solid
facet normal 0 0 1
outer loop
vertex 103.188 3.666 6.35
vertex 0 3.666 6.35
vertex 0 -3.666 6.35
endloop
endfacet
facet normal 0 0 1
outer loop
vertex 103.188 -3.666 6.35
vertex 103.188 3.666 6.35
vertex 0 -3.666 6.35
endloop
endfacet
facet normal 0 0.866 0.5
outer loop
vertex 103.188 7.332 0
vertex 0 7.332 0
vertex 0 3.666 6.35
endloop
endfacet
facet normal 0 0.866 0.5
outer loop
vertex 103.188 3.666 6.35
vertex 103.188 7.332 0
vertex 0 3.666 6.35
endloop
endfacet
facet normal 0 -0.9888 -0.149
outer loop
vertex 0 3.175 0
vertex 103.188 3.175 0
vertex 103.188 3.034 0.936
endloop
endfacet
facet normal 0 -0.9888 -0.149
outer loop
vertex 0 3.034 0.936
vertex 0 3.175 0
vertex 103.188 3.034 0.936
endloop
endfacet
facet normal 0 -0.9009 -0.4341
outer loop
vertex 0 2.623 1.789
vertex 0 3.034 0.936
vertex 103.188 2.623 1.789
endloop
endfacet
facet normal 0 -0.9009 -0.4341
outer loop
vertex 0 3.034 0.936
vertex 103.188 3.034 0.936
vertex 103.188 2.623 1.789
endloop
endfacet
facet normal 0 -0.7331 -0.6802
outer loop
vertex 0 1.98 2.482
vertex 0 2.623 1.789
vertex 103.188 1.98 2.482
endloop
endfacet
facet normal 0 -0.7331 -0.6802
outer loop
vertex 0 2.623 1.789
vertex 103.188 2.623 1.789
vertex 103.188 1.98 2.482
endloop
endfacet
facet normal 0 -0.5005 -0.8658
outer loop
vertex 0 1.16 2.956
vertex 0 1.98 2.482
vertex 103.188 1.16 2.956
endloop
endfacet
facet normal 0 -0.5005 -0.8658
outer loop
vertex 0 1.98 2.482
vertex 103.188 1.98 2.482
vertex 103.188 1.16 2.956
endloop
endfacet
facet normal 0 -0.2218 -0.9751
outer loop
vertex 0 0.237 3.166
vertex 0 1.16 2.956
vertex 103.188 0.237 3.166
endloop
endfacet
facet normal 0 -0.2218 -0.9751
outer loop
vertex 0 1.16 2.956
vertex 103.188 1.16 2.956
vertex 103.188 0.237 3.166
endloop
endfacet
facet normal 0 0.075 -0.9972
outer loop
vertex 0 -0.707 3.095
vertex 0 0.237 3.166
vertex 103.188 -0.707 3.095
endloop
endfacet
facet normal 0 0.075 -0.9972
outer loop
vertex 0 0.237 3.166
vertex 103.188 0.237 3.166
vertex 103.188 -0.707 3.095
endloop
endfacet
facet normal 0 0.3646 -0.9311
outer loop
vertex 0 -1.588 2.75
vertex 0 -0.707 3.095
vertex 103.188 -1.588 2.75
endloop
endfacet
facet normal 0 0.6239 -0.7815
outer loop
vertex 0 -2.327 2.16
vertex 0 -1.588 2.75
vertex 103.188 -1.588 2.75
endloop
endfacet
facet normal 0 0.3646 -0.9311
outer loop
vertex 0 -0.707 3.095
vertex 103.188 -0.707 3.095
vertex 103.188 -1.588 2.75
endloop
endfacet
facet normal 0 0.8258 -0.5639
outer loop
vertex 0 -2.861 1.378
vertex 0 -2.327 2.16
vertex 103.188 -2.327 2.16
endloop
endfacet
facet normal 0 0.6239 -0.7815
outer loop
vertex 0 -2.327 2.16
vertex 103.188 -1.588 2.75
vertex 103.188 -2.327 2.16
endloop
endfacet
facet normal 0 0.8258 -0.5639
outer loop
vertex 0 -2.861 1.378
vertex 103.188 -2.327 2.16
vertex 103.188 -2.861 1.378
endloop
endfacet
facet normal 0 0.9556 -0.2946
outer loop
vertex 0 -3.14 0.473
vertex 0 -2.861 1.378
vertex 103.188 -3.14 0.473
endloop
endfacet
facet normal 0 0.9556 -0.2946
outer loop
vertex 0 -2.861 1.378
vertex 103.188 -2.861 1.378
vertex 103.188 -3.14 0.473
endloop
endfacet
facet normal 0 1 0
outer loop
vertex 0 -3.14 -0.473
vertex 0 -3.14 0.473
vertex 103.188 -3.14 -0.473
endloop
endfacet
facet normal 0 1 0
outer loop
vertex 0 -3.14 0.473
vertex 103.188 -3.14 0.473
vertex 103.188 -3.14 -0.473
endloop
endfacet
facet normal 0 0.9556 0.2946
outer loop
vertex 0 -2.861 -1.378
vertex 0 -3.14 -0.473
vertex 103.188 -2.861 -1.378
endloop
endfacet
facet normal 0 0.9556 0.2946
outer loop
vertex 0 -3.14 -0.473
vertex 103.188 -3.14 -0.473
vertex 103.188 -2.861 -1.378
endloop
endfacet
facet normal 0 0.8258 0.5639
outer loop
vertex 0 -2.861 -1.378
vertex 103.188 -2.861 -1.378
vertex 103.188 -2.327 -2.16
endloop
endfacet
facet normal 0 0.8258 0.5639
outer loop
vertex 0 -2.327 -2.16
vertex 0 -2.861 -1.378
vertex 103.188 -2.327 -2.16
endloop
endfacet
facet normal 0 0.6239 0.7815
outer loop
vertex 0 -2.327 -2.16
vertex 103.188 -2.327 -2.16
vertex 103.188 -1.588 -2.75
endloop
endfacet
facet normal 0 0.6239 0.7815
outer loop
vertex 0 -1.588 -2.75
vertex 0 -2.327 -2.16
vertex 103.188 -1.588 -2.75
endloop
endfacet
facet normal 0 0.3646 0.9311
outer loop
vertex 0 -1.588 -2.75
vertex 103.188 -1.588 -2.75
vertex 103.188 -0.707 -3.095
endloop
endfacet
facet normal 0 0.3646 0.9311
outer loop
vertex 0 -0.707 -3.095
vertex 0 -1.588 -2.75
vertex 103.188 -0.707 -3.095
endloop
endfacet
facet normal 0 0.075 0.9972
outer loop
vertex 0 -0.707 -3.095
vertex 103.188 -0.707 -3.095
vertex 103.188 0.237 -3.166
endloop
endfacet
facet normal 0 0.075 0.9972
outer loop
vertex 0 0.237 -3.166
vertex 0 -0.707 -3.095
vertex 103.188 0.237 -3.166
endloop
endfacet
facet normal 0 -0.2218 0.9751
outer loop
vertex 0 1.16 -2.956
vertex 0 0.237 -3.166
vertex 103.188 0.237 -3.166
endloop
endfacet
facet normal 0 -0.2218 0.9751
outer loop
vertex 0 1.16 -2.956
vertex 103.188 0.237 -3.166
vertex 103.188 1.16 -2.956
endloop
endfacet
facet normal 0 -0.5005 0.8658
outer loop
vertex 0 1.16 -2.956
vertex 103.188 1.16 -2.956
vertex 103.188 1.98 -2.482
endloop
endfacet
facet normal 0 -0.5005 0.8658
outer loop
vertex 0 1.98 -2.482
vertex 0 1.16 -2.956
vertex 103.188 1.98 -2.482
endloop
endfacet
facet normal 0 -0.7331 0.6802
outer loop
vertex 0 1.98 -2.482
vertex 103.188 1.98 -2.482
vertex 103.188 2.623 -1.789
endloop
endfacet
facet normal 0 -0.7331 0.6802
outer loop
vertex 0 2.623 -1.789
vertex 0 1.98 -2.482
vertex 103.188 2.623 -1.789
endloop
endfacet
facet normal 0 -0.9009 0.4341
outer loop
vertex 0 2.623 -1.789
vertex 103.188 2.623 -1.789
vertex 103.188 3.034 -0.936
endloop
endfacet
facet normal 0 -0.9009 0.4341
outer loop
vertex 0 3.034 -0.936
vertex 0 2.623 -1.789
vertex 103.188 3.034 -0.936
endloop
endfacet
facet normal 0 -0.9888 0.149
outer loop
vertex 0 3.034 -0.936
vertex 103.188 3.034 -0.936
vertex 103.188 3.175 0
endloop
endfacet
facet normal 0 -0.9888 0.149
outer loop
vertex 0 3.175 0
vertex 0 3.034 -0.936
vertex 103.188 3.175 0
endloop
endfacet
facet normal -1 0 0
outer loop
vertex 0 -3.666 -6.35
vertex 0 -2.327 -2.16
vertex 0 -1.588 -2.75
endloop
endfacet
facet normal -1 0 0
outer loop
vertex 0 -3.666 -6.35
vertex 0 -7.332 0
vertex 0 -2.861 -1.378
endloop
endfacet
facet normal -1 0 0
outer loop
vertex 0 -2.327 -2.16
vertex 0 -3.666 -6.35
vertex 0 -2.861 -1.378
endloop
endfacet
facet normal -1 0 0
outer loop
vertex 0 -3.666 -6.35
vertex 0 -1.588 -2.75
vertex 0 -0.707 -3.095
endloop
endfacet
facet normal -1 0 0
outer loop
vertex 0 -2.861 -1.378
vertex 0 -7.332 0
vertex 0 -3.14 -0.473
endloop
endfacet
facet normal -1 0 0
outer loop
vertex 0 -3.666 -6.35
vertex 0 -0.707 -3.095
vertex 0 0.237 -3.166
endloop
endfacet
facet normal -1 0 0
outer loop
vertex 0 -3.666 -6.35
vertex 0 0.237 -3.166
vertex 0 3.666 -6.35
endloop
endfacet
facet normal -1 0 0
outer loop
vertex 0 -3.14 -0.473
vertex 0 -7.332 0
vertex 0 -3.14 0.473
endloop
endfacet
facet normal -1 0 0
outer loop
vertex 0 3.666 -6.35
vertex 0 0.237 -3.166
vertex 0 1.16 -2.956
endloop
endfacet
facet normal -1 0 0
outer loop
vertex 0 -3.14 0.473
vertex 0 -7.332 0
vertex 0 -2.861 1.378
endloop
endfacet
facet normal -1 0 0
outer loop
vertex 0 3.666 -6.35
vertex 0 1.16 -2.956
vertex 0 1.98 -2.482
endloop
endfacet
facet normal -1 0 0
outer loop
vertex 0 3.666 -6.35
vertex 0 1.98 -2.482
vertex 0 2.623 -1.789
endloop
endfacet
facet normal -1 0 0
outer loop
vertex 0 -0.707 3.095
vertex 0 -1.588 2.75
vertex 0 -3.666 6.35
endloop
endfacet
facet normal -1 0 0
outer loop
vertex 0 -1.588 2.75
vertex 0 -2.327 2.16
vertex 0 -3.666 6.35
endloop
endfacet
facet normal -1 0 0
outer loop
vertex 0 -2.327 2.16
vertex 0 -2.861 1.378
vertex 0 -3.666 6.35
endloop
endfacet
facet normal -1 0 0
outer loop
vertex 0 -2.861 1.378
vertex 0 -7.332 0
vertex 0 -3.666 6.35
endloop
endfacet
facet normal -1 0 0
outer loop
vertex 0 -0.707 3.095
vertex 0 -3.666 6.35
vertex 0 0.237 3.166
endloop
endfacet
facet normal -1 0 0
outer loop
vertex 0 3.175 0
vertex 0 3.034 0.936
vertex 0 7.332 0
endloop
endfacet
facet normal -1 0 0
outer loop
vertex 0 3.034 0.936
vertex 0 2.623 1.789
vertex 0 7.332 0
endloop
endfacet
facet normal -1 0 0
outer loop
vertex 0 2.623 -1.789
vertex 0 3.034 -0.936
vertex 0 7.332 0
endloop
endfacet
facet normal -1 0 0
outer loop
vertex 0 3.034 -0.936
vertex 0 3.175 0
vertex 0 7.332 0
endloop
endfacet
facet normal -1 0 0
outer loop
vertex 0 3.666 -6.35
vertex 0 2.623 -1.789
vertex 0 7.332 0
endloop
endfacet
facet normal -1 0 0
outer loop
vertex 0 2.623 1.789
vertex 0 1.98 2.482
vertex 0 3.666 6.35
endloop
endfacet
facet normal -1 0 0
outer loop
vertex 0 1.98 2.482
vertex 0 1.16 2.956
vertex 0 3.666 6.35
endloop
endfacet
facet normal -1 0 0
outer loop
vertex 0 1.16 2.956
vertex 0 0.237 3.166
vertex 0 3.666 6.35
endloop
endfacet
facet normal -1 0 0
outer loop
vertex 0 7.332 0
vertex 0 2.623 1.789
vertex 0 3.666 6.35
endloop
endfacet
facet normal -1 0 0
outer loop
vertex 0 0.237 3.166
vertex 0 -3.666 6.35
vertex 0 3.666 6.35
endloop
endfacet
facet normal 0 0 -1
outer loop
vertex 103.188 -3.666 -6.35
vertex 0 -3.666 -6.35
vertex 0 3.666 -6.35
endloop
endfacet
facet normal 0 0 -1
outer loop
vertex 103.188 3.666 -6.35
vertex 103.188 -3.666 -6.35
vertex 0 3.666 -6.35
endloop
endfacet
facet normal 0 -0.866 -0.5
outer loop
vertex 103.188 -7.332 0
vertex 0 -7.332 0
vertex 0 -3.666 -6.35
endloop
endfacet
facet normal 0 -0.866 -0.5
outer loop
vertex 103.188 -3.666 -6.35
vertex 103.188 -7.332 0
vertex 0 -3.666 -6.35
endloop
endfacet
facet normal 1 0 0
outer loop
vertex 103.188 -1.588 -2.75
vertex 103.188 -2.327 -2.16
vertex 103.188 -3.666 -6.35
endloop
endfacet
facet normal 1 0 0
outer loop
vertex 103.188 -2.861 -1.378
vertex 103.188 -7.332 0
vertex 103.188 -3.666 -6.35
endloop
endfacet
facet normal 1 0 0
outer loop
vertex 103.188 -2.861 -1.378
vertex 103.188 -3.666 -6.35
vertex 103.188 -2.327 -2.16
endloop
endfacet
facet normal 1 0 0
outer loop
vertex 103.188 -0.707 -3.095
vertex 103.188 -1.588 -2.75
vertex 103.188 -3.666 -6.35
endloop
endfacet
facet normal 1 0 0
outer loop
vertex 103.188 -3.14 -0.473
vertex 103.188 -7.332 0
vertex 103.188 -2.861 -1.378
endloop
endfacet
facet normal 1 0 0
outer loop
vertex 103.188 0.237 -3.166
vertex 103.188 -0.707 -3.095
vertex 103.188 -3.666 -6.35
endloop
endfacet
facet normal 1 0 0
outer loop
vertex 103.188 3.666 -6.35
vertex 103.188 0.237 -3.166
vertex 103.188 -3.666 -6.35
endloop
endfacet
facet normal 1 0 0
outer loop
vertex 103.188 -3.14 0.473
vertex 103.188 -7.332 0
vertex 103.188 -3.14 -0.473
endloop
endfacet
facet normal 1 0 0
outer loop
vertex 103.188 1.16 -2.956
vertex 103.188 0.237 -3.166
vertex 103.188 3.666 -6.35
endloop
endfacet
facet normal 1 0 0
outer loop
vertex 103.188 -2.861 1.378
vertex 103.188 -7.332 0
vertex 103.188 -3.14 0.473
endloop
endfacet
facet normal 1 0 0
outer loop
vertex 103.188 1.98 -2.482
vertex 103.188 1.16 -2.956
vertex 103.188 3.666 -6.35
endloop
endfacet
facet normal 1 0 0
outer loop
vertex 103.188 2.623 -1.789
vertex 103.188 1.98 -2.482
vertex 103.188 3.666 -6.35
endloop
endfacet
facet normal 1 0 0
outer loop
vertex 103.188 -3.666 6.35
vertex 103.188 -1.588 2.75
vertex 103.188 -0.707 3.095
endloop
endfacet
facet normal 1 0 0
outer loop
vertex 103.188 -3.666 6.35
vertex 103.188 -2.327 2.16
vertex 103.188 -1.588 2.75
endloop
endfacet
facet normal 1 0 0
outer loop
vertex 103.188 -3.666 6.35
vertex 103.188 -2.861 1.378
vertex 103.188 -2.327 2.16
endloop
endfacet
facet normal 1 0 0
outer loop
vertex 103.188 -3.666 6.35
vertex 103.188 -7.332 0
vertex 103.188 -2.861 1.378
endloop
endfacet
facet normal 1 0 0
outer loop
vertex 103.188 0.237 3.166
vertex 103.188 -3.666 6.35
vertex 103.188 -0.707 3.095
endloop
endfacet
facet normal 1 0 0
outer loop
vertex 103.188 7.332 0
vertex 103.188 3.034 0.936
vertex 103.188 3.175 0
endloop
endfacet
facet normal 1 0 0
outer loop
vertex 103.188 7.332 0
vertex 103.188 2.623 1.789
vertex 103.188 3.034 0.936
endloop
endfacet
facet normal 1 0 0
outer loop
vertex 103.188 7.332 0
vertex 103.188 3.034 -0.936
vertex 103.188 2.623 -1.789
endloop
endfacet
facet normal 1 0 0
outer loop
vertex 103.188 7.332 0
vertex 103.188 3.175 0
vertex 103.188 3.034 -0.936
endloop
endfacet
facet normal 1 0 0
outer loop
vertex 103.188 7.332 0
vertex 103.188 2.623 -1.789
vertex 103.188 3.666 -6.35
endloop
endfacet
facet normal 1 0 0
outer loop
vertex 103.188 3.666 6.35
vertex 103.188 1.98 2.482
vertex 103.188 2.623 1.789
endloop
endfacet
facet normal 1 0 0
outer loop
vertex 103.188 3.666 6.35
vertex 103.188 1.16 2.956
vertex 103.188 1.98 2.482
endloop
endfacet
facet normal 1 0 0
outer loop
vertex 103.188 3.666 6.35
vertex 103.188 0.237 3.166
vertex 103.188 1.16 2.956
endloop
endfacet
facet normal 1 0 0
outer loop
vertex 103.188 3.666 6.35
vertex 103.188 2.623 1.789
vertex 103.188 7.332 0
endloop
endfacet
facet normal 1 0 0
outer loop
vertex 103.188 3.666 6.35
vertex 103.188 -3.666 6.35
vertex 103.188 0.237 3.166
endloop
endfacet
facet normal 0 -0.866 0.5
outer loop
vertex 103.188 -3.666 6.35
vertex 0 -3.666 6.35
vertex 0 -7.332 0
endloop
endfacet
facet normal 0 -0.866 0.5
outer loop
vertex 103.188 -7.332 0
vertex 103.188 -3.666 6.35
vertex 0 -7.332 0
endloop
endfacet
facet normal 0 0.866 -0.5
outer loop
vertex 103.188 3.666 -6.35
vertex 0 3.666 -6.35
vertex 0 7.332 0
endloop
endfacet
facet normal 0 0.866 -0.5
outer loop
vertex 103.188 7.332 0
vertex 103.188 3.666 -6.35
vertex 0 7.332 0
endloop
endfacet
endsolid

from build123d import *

# Parameters (mm, degrees)
F1_DEPTH = 103.1875
F2_R     = 3.175
F3_DEPTH = 103.1885


with BuildPart() as f1:
    # F0 (on Right) → F1 (new body)
    with BuildSketch(Plane.YZ):
        Polygon((3.666174, 6.35), (-3.666174, 6.35), (-7.332348, 0), (-3.666174, -6.35), (3.666174, -6.35), (7.332348, 0), align=None)
    extrude(amount=F1_DEPTH)

    # F2 (on face) → F3 (cut, through all)
    with BuildSketch(Plane.YZ.offset(103.1875)):
        Circle(F2_R)
    extrude(amount=-F3_DEPTH, mode=Mode.SUBTRACT)


solid = f1.part
